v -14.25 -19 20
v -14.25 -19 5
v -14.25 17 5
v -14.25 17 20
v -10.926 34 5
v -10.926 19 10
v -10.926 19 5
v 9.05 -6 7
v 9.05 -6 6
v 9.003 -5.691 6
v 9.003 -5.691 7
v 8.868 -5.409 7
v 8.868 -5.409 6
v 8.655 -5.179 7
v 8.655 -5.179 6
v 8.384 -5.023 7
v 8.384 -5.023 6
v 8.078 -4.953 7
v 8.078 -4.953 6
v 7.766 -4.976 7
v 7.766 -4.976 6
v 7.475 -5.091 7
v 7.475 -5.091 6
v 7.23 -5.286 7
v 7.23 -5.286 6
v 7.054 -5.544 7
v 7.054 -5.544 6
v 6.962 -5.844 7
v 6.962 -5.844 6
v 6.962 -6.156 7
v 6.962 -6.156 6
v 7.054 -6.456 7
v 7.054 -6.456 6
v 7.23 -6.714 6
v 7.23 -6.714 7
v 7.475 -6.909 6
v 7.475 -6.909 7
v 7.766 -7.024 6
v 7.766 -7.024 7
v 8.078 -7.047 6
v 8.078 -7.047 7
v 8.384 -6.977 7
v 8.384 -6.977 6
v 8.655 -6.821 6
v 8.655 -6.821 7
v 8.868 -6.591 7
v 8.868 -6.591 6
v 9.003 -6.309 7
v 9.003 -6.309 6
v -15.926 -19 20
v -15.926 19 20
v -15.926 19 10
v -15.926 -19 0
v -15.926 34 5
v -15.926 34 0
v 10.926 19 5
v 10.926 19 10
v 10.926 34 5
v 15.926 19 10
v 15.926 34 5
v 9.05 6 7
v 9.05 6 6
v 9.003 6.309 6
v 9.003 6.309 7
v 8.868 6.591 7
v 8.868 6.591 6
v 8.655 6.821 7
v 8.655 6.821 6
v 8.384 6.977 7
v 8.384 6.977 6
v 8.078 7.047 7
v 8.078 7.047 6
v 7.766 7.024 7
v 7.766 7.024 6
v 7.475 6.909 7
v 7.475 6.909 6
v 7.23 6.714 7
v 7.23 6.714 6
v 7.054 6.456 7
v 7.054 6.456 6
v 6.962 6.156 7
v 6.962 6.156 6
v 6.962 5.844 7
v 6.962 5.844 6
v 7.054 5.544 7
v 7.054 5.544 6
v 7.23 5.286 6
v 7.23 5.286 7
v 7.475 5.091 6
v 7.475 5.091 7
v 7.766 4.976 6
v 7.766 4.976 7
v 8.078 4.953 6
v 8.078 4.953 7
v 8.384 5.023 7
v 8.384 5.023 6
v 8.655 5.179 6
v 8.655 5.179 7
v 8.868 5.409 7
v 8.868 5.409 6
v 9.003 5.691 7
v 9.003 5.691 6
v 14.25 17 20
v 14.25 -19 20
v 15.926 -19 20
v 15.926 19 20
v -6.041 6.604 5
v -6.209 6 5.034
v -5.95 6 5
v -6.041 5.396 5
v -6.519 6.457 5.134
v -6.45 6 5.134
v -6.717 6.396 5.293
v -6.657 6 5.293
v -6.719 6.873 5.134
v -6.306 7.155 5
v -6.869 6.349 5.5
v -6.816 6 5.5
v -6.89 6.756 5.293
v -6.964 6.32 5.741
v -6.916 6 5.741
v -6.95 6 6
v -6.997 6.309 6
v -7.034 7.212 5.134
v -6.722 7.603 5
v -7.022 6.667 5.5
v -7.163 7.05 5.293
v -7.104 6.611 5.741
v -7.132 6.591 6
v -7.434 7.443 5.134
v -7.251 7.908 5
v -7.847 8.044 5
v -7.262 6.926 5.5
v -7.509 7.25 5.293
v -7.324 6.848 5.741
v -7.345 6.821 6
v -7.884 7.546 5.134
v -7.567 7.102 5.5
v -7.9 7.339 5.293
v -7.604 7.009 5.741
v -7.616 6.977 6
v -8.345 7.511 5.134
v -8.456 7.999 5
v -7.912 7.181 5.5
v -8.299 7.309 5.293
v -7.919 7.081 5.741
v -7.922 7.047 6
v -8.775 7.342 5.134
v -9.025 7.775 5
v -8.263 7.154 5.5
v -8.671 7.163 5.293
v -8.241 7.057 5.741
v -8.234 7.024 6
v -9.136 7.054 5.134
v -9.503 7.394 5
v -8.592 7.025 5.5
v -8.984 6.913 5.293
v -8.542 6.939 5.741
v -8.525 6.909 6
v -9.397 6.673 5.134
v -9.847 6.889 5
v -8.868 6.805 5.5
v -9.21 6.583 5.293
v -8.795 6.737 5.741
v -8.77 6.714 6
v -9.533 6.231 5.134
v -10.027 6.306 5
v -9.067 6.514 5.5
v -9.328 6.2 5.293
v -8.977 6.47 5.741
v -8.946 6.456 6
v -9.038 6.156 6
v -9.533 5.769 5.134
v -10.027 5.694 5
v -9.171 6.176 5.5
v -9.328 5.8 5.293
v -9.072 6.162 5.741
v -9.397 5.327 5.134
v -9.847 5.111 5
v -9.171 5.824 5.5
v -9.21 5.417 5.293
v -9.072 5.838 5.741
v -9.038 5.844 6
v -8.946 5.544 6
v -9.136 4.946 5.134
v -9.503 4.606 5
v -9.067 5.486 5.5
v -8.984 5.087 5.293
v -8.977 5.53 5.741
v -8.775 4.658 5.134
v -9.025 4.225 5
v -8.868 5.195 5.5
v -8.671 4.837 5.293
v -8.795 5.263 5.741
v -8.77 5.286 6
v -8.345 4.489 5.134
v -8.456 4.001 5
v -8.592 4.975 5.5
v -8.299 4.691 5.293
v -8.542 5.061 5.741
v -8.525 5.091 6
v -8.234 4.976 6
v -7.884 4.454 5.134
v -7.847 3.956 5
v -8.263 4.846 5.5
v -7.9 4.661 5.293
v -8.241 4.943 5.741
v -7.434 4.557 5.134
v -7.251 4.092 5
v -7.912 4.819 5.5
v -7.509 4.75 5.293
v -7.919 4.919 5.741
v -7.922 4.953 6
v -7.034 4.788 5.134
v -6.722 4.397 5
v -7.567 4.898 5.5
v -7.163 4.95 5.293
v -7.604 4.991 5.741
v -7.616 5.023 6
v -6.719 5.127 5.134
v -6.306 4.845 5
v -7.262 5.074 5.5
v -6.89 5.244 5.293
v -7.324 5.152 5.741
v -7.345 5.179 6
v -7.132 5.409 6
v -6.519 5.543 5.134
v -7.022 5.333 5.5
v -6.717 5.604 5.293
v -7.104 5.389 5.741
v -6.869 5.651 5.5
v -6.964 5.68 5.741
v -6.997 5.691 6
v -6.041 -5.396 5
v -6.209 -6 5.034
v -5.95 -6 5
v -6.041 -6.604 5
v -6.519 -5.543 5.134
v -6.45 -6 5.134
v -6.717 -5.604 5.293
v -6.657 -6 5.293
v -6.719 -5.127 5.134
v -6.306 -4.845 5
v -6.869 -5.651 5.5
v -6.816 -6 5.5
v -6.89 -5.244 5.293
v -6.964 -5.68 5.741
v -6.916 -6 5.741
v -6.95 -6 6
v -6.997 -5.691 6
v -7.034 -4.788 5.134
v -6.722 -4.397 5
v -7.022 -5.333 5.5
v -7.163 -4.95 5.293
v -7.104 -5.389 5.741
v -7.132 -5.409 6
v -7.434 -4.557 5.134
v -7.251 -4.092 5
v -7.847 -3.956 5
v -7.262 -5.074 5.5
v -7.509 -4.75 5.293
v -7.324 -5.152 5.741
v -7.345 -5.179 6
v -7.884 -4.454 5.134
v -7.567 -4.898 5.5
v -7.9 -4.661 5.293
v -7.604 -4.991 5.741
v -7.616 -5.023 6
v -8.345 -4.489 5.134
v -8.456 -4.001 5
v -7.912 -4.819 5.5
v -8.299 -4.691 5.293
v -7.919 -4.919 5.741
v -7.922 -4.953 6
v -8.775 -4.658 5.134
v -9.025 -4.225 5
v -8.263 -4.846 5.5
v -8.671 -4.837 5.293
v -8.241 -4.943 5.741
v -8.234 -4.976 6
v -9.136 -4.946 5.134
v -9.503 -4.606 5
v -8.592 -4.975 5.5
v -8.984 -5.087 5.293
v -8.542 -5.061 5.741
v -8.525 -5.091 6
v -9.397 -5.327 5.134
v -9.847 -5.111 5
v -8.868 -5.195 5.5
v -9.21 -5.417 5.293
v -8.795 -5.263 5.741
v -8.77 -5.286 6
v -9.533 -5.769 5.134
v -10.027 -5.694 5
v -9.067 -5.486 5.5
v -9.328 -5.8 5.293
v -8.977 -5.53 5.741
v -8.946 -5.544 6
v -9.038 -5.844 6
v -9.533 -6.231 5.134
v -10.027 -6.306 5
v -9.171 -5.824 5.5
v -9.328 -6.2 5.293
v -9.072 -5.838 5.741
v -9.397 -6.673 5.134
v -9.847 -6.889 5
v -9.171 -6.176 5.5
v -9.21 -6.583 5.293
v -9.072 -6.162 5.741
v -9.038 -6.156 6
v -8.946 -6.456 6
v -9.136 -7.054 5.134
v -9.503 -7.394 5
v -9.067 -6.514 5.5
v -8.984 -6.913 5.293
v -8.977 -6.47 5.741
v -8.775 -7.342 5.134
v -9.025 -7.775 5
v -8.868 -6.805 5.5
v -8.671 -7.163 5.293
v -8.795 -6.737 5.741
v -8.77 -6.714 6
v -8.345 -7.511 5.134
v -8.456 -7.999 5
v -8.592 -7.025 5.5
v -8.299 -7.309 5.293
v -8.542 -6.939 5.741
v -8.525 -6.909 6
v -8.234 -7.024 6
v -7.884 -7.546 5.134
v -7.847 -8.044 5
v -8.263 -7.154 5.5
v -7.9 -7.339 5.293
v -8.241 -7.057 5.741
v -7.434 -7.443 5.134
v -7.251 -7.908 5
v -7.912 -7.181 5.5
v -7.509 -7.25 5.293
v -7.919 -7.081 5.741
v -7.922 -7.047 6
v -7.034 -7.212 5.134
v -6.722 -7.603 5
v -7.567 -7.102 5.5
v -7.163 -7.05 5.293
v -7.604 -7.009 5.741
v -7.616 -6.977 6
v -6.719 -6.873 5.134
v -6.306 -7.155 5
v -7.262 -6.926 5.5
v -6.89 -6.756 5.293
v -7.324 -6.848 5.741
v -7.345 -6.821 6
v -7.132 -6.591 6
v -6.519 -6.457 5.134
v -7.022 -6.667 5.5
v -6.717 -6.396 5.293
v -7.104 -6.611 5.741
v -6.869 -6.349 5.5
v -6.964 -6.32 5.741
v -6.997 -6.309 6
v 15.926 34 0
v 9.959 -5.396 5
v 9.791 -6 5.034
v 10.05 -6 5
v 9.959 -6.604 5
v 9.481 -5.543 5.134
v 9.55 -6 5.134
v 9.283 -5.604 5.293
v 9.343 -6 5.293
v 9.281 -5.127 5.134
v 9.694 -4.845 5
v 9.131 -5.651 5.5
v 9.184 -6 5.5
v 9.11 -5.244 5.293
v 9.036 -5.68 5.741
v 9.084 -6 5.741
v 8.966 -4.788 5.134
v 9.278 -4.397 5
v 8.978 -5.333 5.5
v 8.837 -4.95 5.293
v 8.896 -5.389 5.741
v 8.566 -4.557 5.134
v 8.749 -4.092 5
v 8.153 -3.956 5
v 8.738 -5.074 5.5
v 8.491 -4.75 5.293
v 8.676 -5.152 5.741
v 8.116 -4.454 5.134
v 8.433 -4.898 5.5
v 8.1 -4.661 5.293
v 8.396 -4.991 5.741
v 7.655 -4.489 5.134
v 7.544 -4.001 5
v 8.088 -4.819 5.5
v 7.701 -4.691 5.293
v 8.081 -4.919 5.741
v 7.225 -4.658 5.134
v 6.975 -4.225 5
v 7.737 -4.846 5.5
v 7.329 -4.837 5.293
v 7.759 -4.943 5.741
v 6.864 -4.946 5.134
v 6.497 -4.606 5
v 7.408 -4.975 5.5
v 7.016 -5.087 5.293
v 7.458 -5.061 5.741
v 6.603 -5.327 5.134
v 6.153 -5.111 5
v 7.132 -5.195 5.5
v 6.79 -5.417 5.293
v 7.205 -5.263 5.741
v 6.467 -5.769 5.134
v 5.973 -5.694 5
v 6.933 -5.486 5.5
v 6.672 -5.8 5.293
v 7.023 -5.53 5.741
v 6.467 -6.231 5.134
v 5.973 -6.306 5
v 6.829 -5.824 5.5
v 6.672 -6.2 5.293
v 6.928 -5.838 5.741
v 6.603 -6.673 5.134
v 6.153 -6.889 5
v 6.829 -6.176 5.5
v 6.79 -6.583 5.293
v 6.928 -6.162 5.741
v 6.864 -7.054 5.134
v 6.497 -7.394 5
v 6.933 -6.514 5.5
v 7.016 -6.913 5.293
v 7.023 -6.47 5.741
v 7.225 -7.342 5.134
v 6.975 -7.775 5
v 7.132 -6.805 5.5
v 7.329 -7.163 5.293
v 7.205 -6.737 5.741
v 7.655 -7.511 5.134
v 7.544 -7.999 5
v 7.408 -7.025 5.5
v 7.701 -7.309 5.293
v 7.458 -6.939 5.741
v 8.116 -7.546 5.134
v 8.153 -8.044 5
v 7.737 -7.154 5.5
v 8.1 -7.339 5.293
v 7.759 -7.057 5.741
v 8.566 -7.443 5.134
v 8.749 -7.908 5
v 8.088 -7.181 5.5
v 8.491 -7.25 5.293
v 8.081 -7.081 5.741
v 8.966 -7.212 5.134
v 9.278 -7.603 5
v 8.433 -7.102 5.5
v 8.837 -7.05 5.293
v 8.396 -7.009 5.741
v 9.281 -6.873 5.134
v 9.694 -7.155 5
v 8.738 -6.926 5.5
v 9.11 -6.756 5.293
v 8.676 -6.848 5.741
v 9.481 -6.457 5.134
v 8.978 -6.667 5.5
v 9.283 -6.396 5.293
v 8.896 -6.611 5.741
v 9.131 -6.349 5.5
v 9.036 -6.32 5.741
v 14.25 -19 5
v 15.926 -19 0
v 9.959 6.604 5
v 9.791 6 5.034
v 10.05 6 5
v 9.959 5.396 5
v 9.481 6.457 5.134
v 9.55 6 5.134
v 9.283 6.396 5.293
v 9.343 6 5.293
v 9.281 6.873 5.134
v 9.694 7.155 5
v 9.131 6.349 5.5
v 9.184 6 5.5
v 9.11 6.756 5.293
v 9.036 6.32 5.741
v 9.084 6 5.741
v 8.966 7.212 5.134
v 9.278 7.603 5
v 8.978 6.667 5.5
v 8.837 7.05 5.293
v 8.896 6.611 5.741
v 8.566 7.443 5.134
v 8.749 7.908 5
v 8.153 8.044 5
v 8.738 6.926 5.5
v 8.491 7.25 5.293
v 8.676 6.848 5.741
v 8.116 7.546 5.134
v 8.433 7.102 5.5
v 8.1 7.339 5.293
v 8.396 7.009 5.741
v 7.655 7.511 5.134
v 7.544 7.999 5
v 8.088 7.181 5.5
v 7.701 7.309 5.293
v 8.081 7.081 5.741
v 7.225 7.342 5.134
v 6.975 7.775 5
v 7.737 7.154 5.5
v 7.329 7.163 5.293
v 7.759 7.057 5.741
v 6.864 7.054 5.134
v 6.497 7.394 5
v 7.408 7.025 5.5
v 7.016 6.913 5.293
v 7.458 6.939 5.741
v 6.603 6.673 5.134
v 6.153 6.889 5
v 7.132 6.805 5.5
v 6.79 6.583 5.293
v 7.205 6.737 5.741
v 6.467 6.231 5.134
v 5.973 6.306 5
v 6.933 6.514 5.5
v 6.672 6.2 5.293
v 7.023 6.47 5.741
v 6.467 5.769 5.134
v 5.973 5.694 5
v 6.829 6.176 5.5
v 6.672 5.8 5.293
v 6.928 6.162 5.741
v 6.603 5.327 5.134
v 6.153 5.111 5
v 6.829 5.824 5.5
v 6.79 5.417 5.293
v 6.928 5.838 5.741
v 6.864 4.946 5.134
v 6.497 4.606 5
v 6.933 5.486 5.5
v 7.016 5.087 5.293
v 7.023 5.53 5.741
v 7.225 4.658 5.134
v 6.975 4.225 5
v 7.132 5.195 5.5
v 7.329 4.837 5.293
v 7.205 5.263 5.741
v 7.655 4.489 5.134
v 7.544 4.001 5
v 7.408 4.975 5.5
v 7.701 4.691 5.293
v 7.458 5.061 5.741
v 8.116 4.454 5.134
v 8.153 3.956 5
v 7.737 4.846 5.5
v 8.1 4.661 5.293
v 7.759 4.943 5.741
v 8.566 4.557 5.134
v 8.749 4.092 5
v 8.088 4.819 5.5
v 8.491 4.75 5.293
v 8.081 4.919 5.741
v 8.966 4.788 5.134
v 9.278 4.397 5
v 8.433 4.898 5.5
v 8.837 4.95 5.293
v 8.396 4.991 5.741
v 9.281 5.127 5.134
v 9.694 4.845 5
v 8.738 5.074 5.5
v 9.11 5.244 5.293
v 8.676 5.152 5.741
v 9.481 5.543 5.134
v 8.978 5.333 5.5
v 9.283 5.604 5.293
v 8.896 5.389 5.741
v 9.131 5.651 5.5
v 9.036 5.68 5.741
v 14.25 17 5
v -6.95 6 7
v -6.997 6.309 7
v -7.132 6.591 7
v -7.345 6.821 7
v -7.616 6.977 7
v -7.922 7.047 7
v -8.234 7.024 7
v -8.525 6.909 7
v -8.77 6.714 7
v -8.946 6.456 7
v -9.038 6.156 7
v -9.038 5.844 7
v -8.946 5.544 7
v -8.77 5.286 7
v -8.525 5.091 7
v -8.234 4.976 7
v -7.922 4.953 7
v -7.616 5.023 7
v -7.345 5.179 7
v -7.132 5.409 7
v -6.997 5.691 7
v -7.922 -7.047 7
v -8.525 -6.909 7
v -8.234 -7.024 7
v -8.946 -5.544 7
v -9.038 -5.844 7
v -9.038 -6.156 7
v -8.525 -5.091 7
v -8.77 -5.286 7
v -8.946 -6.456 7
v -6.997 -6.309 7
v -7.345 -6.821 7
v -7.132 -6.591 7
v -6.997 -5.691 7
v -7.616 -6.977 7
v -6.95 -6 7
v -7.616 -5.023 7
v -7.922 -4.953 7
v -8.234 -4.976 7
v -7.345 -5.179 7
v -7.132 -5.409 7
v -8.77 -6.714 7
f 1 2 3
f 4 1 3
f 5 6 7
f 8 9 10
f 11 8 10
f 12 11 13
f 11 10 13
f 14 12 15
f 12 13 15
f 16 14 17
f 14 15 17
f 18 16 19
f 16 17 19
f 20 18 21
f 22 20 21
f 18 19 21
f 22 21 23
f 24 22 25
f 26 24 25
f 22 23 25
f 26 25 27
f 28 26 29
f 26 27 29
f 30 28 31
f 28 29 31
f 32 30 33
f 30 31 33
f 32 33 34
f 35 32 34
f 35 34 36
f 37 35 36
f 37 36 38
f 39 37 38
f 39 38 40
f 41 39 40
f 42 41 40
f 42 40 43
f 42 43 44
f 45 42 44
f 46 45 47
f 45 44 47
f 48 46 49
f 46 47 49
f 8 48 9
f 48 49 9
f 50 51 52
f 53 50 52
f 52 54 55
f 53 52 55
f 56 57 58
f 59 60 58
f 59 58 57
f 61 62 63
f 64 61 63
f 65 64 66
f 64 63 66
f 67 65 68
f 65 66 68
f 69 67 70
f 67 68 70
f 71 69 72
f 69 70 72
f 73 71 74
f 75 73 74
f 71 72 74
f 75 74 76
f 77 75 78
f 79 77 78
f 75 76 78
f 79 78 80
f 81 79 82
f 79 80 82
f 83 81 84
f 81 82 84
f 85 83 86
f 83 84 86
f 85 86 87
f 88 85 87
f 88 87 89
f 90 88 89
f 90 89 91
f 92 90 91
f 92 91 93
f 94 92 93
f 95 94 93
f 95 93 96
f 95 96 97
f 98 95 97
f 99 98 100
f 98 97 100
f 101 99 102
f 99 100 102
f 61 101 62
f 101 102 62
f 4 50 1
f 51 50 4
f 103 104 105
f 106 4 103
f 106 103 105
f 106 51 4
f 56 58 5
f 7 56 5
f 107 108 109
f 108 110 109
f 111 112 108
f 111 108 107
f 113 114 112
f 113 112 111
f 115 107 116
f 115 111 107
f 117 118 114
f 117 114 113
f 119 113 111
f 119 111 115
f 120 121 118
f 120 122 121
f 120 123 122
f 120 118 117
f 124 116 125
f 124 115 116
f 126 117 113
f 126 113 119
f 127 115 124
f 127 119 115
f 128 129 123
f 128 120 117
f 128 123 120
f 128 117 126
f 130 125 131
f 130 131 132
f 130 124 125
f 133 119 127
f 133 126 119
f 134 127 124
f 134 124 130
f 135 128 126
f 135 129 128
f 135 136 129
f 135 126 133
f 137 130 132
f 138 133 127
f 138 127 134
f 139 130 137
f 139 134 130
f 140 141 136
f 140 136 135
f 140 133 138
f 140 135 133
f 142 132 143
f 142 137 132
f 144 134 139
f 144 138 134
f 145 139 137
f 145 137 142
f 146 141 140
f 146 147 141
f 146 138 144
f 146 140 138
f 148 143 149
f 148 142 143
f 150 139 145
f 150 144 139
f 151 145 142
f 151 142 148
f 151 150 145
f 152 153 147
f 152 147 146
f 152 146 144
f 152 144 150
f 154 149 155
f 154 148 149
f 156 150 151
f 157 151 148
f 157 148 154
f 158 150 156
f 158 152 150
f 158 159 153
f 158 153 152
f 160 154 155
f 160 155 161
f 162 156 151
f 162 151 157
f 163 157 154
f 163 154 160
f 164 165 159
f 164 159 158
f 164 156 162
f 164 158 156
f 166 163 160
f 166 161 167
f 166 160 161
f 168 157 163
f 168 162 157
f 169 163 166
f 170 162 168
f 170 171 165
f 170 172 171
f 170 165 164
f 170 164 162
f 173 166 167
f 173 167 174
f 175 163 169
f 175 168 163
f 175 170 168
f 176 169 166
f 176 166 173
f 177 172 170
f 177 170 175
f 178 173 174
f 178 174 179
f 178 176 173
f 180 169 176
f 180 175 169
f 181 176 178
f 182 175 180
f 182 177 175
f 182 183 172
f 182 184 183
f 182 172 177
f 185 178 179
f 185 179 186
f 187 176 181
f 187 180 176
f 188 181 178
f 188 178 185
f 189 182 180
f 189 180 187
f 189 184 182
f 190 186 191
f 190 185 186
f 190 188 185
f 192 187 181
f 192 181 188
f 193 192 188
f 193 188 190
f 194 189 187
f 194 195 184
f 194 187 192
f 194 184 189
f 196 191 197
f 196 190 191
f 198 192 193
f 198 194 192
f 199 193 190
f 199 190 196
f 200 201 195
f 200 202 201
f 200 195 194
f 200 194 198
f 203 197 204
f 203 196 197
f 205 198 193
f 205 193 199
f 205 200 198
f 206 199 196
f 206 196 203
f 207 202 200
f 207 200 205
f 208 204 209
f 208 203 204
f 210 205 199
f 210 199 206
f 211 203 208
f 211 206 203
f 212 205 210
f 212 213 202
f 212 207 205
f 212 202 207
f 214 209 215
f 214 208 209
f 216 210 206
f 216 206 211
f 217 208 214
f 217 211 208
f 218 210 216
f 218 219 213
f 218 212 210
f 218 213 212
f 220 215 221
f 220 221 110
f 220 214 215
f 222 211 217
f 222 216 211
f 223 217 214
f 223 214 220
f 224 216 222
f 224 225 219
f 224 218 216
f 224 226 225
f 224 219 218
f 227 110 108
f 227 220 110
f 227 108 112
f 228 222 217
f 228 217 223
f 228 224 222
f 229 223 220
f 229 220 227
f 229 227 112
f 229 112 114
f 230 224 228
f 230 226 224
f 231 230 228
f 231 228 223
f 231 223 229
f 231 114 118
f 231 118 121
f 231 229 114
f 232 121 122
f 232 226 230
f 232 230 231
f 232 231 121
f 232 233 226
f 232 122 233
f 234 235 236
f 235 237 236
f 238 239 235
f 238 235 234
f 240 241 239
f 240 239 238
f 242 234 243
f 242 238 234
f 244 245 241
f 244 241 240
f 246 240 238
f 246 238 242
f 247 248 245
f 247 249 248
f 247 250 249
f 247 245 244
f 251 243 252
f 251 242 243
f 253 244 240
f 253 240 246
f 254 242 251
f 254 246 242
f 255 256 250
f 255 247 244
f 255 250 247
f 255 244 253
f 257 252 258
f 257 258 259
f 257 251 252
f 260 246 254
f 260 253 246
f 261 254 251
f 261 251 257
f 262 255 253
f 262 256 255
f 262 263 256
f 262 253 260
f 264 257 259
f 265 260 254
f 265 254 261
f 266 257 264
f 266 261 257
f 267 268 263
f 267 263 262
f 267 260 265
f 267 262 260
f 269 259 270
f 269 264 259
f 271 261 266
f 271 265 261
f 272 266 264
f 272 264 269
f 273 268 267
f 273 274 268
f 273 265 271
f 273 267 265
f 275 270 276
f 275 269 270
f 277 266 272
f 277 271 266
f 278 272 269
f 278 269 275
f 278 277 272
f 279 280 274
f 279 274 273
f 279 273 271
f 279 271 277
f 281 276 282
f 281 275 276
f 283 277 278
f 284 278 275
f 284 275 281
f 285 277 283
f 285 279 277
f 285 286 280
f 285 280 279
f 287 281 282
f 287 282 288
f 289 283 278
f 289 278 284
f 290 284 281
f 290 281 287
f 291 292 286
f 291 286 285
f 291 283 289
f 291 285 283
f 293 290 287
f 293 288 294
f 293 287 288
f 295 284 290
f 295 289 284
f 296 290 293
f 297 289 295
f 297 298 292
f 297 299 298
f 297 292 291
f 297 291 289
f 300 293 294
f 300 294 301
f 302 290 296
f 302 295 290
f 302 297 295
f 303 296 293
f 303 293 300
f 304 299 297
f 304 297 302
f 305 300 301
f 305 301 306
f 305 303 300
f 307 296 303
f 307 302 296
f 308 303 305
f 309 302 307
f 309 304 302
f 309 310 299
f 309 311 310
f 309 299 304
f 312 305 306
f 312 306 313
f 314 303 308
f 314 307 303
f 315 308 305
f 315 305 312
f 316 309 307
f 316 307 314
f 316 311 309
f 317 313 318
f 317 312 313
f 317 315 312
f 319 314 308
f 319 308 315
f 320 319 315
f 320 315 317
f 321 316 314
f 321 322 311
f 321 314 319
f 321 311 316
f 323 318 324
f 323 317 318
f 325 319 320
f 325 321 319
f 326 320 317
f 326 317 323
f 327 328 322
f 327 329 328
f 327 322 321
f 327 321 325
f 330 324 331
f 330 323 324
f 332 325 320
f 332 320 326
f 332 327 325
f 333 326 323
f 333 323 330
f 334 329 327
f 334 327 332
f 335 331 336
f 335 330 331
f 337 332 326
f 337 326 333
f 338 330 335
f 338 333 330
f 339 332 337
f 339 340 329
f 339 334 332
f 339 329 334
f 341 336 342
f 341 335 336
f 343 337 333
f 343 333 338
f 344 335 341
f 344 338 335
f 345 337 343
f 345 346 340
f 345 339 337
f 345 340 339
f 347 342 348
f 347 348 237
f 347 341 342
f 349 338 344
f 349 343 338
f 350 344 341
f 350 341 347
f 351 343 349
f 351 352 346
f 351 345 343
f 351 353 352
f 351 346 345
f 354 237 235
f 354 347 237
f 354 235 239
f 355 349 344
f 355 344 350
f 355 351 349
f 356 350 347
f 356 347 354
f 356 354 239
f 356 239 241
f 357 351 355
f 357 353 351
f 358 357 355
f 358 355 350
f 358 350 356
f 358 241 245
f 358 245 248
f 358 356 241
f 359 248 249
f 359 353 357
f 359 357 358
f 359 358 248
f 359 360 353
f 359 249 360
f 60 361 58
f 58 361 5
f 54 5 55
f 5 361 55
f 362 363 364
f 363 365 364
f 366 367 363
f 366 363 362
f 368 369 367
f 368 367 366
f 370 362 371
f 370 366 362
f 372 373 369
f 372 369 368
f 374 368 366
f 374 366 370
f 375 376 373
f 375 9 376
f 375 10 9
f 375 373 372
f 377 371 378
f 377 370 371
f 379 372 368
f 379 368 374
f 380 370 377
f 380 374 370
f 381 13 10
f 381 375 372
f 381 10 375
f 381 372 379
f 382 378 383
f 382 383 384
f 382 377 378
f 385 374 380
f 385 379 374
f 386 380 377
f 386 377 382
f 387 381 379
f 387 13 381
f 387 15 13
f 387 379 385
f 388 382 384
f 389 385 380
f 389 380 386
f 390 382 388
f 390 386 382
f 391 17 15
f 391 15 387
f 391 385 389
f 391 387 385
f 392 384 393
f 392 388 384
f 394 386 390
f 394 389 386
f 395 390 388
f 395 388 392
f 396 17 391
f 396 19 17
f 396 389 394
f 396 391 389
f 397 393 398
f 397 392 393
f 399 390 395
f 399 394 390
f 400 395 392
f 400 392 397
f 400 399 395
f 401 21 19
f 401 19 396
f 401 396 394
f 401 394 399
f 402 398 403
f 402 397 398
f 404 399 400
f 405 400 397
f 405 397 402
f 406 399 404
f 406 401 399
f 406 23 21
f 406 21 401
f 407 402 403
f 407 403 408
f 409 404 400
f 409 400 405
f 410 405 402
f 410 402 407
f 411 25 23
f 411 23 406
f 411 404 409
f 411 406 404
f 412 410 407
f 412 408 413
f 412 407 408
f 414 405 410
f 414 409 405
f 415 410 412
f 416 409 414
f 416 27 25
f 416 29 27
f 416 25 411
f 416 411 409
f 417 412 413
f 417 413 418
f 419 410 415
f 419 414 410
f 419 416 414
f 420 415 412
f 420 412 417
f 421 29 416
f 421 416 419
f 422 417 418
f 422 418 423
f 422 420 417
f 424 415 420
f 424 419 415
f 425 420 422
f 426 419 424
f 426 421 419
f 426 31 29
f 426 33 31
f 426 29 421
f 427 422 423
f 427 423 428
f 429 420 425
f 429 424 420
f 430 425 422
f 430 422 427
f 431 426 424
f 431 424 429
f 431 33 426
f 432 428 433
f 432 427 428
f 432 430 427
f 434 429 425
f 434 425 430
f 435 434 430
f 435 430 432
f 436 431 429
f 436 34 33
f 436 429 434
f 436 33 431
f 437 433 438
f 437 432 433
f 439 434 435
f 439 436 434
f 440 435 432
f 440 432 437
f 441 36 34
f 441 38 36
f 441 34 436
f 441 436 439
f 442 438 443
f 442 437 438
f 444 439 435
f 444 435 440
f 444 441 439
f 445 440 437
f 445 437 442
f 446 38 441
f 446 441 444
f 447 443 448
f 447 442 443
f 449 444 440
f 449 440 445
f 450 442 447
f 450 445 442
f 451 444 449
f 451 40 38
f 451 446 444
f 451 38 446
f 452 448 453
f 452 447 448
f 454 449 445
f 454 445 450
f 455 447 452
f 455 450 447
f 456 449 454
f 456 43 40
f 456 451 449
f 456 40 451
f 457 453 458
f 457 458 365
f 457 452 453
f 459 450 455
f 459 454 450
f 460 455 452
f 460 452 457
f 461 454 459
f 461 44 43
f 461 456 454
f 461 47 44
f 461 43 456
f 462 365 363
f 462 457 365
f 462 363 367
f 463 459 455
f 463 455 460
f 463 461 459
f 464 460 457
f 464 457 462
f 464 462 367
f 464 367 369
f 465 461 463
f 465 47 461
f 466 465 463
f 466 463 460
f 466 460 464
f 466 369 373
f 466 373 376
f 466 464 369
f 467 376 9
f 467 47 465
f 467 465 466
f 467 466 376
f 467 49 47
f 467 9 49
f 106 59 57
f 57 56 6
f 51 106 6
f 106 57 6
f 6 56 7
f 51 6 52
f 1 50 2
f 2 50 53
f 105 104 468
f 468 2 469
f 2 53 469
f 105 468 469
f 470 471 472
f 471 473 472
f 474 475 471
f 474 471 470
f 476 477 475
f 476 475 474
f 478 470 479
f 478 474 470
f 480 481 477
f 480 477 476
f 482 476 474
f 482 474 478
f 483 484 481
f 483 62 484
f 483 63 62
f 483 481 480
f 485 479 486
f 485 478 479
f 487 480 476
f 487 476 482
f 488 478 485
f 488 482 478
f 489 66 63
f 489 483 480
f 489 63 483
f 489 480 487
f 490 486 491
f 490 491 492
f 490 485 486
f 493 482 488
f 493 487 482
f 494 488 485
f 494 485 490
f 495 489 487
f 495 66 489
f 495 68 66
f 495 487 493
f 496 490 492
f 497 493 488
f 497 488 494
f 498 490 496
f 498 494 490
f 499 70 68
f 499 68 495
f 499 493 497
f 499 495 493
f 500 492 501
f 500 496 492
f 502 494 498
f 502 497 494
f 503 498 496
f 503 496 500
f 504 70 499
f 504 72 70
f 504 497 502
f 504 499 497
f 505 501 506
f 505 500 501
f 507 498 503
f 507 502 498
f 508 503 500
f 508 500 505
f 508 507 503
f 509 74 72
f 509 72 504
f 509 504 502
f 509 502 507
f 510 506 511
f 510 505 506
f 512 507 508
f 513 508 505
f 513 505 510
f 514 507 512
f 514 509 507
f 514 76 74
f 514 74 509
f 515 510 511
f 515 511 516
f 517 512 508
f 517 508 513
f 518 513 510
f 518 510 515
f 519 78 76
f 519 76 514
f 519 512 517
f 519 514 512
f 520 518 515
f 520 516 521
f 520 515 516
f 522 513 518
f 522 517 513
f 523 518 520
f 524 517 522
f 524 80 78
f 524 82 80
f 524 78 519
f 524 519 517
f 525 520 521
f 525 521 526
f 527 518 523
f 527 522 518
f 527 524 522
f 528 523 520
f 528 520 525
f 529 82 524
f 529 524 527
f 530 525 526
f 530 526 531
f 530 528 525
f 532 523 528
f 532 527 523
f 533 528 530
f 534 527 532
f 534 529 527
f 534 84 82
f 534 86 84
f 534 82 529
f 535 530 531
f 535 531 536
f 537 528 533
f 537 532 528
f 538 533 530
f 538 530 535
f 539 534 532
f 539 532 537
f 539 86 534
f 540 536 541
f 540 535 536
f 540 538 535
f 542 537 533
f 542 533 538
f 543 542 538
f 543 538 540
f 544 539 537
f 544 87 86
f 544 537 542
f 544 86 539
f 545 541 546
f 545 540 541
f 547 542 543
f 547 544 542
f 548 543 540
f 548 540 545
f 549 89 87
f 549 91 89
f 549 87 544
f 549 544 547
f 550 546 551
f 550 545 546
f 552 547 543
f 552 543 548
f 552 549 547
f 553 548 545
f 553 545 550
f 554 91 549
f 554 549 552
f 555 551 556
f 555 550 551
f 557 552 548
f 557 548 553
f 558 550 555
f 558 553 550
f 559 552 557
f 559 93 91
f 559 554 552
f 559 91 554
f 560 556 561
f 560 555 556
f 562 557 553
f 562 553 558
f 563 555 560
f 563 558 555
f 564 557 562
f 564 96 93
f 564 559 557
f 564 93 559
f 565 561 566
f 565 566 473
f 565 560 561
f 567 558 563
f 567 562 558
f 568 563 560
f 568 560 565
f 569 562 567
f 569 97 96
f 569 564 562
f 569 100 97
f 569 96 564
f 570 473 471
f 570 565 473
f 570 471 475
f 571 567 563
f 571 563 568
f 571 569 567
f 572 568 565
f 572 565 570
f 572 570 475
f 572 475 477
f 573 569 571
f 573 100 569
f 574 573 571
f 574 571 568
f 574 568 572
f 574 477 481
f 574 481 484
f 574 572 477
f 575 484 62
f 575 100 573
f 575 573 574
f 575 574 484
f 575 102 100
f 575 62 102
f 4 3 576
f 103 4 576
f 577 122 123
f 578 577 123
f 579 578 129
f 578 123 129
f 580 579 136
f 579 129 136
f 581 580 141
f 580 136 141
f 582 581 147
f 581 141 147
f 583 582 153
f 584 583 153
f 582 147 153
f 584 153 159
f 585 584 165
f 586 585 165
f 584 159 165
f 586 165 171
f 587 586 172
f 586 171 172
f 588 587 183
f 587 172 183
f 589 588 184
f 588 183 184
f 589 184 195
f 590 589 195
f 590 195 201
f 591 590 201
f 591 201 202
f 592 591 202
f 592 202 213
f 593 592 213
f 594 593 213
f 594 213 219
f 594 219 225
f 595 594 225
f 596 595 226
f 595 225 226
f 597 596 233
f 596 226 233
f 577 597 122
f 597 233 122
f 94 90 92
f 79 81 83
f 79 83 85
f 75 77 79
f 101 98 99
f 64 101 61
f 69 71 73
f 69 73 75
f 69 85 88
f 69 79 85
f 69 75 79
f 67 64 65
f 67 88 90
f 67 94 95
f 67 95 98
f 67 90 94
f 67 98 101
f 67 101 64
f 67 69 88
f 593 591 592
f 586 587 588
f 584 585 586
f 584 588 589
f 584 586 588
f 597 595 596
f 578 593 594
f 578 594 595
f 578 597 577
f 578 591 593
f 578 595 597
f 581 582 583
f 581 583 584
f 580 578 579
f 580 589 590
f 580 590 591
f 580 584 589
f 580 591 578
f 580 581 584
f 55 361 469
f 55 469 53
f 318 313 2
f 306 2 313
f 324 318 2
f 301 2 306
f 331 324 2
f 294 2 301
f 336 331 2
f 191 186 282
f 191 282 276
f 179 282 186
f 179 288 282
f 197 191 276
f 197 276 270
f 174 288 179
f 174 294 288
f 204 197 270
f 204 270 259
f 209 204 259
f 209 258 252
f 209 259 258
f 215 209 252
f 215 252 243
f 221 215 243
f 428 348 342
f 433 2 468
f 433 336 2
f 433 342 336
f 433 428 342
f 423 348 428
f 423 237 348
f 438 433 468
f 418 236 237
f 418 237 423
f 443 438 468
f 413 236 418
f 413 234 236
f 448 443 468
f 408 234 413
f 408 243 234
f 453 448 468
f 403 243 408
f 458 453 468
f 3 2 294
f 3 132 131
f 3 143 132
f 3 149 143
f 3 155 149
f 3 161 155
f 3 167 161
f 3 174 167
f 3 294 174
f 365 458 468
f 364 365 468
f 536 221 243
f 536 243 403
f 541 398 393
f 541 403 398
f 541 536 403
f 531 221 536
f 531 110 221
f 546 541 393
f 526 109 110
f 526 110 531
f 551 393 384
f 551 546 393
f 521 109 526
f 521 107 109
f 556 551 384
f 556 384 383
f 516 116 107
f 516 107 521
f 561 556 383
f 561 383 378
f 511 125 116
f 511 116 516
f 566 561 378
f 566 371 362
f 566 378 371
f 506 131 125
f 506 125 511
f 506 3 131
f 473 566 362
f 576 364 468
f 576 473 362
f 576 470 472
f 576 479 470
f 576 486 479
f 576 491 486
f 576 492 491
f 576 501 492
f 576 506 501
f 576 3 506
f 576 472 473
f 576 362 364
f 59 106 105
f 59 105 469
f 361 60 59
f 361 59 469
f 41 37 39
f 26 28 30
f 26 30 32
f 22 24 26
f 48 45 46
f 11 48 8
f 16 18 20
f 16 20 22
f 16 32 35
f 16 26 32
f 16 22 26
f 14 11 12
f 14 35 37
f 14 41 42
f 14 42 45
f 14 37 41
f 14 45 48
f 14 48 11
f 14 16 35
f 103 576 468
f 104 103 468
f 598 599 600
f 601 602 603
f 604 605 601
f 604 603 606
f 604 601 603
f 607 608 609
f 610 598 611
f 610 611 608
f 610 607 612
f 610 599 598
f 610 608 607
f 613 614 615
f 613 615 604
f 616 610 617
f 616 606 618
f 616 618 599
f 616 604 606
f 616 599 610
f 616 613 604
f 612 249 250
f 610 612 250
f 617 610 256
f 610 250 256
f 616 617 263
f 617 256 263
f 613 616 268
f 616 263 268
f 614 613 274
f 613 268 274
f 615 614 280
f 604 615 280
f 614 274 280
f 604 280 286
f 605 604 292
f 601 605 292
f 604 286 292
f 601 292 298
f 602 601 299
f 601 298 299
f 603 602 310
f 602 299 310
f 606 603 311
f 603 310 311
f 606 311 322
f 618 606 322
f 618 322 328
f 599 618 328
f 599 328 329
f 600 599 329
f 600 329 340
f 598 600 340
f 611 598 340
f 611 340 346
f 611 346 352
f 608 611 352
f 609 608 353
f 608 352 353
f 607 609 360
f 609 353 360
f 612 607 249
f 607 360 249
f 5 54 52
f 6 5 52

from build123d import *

# Parameters (mm, degrees)
SKETCH_1_W      = 31.852941176
SKETCH_1_H      = 38
EXTRUDE_1_DEPTH = 5
EXTRUDE_2_DEPTH = 15
SKETCH_3_R      = 1.05
EXTRUDE_3_DEPTH = 2
SKETCH_4_W      = 31.852941176
SKETCH_4_H      = 15
EXTRUDE_4_DEPTH = 5
EXTRUDE_5_DEPTH = 5
EXTRUDE_6_DEPTH = 5
FILLET_1_R      = 1


with BuildPart() as part:
    # 草图1 → 凸台-拉伸1 (new body)
    with BuildSketch(Plane.XY):
        Rectangle(SKETCH_1_W, SKETCH_1_H)
    extrude(amount=EXTRUDE_1_DEPTH)

    # 草图2 → 凸台-拉伸2 (add)
    with BuildSketch(Plane.XY.offset(5)):
        Polygon((-14.25, -19), (-14.25, -17), (-14.25, 17), (14.25, 17), (14.25, -17), (14.25, -19), (15.926470588, -19), (15.926470588, 19), (-15.926470588, 19), (-15.926470588, -19), align=None)
    extrude(amount=EXTRUDE_2_DEPTH)

    # 草图3 → 凸台-拉伸3 (add)
    with BuildSketch(Plane.XY.offset(5)):
        with Locations((-8, 6)):
            Circle(SKETCH_3_R)
        with Locations((8, 6)):
            Circle(SKETCH_3_R)
        with Locations((-8, -6)):
            Circle(SKETCH_3_R)
        with Locations((8, -6)):
            Circle(SKETCH_3_R)
    extrude(amount=EXTRUDE_3_DEPTH)

    # 草图4 → 凸台-拉伸4 (add)
    with BuildSketch(Plane(origin=(0, 0, 0), x_dir=(-1, 0, 0), z_dir=(0, 0, -1))):
        with Locations((0, 26.5)):
            Rectangle(SKETCH_4_W, SKETCH_4_H)
    extrude(amount=-EXTRUDE_4_DEPTH)

    # 草图5 → 凸台-拉伸5 (add)
    with BuildSketch(Plane.ZY.offset(15.926470588)):
        Polygon((5, 34), (10, 19), (5, 19), align=None)
    extrude(amount=-EXTRUDE_5_DEPTH)

    # 草图6 → 凸台-拉伸6 (add)
    with BuildSketch(Plane(origin=(15.926470588, 0, 0), x_dir=(0, 0, -1), z_dir=(1, 0, 0))):
        Polygon((-5, 19), (-5, 34), (-10, 19), align=None)
    extrude(amount=-EXTRUDE_6_DEPTH)

    # 圆角1
    fillet_1_edges = [part.edges().sort_by_distance(p)[0] for p in [
        (-9.05, 6, 5),
        (6.95, 6, 5),
        (-9.05, -6, 5),
        (6.95, -6, 5),
    ]]
    fillet(fillet_1_edges, radius=FILLET_1_R)


solid = part.part
